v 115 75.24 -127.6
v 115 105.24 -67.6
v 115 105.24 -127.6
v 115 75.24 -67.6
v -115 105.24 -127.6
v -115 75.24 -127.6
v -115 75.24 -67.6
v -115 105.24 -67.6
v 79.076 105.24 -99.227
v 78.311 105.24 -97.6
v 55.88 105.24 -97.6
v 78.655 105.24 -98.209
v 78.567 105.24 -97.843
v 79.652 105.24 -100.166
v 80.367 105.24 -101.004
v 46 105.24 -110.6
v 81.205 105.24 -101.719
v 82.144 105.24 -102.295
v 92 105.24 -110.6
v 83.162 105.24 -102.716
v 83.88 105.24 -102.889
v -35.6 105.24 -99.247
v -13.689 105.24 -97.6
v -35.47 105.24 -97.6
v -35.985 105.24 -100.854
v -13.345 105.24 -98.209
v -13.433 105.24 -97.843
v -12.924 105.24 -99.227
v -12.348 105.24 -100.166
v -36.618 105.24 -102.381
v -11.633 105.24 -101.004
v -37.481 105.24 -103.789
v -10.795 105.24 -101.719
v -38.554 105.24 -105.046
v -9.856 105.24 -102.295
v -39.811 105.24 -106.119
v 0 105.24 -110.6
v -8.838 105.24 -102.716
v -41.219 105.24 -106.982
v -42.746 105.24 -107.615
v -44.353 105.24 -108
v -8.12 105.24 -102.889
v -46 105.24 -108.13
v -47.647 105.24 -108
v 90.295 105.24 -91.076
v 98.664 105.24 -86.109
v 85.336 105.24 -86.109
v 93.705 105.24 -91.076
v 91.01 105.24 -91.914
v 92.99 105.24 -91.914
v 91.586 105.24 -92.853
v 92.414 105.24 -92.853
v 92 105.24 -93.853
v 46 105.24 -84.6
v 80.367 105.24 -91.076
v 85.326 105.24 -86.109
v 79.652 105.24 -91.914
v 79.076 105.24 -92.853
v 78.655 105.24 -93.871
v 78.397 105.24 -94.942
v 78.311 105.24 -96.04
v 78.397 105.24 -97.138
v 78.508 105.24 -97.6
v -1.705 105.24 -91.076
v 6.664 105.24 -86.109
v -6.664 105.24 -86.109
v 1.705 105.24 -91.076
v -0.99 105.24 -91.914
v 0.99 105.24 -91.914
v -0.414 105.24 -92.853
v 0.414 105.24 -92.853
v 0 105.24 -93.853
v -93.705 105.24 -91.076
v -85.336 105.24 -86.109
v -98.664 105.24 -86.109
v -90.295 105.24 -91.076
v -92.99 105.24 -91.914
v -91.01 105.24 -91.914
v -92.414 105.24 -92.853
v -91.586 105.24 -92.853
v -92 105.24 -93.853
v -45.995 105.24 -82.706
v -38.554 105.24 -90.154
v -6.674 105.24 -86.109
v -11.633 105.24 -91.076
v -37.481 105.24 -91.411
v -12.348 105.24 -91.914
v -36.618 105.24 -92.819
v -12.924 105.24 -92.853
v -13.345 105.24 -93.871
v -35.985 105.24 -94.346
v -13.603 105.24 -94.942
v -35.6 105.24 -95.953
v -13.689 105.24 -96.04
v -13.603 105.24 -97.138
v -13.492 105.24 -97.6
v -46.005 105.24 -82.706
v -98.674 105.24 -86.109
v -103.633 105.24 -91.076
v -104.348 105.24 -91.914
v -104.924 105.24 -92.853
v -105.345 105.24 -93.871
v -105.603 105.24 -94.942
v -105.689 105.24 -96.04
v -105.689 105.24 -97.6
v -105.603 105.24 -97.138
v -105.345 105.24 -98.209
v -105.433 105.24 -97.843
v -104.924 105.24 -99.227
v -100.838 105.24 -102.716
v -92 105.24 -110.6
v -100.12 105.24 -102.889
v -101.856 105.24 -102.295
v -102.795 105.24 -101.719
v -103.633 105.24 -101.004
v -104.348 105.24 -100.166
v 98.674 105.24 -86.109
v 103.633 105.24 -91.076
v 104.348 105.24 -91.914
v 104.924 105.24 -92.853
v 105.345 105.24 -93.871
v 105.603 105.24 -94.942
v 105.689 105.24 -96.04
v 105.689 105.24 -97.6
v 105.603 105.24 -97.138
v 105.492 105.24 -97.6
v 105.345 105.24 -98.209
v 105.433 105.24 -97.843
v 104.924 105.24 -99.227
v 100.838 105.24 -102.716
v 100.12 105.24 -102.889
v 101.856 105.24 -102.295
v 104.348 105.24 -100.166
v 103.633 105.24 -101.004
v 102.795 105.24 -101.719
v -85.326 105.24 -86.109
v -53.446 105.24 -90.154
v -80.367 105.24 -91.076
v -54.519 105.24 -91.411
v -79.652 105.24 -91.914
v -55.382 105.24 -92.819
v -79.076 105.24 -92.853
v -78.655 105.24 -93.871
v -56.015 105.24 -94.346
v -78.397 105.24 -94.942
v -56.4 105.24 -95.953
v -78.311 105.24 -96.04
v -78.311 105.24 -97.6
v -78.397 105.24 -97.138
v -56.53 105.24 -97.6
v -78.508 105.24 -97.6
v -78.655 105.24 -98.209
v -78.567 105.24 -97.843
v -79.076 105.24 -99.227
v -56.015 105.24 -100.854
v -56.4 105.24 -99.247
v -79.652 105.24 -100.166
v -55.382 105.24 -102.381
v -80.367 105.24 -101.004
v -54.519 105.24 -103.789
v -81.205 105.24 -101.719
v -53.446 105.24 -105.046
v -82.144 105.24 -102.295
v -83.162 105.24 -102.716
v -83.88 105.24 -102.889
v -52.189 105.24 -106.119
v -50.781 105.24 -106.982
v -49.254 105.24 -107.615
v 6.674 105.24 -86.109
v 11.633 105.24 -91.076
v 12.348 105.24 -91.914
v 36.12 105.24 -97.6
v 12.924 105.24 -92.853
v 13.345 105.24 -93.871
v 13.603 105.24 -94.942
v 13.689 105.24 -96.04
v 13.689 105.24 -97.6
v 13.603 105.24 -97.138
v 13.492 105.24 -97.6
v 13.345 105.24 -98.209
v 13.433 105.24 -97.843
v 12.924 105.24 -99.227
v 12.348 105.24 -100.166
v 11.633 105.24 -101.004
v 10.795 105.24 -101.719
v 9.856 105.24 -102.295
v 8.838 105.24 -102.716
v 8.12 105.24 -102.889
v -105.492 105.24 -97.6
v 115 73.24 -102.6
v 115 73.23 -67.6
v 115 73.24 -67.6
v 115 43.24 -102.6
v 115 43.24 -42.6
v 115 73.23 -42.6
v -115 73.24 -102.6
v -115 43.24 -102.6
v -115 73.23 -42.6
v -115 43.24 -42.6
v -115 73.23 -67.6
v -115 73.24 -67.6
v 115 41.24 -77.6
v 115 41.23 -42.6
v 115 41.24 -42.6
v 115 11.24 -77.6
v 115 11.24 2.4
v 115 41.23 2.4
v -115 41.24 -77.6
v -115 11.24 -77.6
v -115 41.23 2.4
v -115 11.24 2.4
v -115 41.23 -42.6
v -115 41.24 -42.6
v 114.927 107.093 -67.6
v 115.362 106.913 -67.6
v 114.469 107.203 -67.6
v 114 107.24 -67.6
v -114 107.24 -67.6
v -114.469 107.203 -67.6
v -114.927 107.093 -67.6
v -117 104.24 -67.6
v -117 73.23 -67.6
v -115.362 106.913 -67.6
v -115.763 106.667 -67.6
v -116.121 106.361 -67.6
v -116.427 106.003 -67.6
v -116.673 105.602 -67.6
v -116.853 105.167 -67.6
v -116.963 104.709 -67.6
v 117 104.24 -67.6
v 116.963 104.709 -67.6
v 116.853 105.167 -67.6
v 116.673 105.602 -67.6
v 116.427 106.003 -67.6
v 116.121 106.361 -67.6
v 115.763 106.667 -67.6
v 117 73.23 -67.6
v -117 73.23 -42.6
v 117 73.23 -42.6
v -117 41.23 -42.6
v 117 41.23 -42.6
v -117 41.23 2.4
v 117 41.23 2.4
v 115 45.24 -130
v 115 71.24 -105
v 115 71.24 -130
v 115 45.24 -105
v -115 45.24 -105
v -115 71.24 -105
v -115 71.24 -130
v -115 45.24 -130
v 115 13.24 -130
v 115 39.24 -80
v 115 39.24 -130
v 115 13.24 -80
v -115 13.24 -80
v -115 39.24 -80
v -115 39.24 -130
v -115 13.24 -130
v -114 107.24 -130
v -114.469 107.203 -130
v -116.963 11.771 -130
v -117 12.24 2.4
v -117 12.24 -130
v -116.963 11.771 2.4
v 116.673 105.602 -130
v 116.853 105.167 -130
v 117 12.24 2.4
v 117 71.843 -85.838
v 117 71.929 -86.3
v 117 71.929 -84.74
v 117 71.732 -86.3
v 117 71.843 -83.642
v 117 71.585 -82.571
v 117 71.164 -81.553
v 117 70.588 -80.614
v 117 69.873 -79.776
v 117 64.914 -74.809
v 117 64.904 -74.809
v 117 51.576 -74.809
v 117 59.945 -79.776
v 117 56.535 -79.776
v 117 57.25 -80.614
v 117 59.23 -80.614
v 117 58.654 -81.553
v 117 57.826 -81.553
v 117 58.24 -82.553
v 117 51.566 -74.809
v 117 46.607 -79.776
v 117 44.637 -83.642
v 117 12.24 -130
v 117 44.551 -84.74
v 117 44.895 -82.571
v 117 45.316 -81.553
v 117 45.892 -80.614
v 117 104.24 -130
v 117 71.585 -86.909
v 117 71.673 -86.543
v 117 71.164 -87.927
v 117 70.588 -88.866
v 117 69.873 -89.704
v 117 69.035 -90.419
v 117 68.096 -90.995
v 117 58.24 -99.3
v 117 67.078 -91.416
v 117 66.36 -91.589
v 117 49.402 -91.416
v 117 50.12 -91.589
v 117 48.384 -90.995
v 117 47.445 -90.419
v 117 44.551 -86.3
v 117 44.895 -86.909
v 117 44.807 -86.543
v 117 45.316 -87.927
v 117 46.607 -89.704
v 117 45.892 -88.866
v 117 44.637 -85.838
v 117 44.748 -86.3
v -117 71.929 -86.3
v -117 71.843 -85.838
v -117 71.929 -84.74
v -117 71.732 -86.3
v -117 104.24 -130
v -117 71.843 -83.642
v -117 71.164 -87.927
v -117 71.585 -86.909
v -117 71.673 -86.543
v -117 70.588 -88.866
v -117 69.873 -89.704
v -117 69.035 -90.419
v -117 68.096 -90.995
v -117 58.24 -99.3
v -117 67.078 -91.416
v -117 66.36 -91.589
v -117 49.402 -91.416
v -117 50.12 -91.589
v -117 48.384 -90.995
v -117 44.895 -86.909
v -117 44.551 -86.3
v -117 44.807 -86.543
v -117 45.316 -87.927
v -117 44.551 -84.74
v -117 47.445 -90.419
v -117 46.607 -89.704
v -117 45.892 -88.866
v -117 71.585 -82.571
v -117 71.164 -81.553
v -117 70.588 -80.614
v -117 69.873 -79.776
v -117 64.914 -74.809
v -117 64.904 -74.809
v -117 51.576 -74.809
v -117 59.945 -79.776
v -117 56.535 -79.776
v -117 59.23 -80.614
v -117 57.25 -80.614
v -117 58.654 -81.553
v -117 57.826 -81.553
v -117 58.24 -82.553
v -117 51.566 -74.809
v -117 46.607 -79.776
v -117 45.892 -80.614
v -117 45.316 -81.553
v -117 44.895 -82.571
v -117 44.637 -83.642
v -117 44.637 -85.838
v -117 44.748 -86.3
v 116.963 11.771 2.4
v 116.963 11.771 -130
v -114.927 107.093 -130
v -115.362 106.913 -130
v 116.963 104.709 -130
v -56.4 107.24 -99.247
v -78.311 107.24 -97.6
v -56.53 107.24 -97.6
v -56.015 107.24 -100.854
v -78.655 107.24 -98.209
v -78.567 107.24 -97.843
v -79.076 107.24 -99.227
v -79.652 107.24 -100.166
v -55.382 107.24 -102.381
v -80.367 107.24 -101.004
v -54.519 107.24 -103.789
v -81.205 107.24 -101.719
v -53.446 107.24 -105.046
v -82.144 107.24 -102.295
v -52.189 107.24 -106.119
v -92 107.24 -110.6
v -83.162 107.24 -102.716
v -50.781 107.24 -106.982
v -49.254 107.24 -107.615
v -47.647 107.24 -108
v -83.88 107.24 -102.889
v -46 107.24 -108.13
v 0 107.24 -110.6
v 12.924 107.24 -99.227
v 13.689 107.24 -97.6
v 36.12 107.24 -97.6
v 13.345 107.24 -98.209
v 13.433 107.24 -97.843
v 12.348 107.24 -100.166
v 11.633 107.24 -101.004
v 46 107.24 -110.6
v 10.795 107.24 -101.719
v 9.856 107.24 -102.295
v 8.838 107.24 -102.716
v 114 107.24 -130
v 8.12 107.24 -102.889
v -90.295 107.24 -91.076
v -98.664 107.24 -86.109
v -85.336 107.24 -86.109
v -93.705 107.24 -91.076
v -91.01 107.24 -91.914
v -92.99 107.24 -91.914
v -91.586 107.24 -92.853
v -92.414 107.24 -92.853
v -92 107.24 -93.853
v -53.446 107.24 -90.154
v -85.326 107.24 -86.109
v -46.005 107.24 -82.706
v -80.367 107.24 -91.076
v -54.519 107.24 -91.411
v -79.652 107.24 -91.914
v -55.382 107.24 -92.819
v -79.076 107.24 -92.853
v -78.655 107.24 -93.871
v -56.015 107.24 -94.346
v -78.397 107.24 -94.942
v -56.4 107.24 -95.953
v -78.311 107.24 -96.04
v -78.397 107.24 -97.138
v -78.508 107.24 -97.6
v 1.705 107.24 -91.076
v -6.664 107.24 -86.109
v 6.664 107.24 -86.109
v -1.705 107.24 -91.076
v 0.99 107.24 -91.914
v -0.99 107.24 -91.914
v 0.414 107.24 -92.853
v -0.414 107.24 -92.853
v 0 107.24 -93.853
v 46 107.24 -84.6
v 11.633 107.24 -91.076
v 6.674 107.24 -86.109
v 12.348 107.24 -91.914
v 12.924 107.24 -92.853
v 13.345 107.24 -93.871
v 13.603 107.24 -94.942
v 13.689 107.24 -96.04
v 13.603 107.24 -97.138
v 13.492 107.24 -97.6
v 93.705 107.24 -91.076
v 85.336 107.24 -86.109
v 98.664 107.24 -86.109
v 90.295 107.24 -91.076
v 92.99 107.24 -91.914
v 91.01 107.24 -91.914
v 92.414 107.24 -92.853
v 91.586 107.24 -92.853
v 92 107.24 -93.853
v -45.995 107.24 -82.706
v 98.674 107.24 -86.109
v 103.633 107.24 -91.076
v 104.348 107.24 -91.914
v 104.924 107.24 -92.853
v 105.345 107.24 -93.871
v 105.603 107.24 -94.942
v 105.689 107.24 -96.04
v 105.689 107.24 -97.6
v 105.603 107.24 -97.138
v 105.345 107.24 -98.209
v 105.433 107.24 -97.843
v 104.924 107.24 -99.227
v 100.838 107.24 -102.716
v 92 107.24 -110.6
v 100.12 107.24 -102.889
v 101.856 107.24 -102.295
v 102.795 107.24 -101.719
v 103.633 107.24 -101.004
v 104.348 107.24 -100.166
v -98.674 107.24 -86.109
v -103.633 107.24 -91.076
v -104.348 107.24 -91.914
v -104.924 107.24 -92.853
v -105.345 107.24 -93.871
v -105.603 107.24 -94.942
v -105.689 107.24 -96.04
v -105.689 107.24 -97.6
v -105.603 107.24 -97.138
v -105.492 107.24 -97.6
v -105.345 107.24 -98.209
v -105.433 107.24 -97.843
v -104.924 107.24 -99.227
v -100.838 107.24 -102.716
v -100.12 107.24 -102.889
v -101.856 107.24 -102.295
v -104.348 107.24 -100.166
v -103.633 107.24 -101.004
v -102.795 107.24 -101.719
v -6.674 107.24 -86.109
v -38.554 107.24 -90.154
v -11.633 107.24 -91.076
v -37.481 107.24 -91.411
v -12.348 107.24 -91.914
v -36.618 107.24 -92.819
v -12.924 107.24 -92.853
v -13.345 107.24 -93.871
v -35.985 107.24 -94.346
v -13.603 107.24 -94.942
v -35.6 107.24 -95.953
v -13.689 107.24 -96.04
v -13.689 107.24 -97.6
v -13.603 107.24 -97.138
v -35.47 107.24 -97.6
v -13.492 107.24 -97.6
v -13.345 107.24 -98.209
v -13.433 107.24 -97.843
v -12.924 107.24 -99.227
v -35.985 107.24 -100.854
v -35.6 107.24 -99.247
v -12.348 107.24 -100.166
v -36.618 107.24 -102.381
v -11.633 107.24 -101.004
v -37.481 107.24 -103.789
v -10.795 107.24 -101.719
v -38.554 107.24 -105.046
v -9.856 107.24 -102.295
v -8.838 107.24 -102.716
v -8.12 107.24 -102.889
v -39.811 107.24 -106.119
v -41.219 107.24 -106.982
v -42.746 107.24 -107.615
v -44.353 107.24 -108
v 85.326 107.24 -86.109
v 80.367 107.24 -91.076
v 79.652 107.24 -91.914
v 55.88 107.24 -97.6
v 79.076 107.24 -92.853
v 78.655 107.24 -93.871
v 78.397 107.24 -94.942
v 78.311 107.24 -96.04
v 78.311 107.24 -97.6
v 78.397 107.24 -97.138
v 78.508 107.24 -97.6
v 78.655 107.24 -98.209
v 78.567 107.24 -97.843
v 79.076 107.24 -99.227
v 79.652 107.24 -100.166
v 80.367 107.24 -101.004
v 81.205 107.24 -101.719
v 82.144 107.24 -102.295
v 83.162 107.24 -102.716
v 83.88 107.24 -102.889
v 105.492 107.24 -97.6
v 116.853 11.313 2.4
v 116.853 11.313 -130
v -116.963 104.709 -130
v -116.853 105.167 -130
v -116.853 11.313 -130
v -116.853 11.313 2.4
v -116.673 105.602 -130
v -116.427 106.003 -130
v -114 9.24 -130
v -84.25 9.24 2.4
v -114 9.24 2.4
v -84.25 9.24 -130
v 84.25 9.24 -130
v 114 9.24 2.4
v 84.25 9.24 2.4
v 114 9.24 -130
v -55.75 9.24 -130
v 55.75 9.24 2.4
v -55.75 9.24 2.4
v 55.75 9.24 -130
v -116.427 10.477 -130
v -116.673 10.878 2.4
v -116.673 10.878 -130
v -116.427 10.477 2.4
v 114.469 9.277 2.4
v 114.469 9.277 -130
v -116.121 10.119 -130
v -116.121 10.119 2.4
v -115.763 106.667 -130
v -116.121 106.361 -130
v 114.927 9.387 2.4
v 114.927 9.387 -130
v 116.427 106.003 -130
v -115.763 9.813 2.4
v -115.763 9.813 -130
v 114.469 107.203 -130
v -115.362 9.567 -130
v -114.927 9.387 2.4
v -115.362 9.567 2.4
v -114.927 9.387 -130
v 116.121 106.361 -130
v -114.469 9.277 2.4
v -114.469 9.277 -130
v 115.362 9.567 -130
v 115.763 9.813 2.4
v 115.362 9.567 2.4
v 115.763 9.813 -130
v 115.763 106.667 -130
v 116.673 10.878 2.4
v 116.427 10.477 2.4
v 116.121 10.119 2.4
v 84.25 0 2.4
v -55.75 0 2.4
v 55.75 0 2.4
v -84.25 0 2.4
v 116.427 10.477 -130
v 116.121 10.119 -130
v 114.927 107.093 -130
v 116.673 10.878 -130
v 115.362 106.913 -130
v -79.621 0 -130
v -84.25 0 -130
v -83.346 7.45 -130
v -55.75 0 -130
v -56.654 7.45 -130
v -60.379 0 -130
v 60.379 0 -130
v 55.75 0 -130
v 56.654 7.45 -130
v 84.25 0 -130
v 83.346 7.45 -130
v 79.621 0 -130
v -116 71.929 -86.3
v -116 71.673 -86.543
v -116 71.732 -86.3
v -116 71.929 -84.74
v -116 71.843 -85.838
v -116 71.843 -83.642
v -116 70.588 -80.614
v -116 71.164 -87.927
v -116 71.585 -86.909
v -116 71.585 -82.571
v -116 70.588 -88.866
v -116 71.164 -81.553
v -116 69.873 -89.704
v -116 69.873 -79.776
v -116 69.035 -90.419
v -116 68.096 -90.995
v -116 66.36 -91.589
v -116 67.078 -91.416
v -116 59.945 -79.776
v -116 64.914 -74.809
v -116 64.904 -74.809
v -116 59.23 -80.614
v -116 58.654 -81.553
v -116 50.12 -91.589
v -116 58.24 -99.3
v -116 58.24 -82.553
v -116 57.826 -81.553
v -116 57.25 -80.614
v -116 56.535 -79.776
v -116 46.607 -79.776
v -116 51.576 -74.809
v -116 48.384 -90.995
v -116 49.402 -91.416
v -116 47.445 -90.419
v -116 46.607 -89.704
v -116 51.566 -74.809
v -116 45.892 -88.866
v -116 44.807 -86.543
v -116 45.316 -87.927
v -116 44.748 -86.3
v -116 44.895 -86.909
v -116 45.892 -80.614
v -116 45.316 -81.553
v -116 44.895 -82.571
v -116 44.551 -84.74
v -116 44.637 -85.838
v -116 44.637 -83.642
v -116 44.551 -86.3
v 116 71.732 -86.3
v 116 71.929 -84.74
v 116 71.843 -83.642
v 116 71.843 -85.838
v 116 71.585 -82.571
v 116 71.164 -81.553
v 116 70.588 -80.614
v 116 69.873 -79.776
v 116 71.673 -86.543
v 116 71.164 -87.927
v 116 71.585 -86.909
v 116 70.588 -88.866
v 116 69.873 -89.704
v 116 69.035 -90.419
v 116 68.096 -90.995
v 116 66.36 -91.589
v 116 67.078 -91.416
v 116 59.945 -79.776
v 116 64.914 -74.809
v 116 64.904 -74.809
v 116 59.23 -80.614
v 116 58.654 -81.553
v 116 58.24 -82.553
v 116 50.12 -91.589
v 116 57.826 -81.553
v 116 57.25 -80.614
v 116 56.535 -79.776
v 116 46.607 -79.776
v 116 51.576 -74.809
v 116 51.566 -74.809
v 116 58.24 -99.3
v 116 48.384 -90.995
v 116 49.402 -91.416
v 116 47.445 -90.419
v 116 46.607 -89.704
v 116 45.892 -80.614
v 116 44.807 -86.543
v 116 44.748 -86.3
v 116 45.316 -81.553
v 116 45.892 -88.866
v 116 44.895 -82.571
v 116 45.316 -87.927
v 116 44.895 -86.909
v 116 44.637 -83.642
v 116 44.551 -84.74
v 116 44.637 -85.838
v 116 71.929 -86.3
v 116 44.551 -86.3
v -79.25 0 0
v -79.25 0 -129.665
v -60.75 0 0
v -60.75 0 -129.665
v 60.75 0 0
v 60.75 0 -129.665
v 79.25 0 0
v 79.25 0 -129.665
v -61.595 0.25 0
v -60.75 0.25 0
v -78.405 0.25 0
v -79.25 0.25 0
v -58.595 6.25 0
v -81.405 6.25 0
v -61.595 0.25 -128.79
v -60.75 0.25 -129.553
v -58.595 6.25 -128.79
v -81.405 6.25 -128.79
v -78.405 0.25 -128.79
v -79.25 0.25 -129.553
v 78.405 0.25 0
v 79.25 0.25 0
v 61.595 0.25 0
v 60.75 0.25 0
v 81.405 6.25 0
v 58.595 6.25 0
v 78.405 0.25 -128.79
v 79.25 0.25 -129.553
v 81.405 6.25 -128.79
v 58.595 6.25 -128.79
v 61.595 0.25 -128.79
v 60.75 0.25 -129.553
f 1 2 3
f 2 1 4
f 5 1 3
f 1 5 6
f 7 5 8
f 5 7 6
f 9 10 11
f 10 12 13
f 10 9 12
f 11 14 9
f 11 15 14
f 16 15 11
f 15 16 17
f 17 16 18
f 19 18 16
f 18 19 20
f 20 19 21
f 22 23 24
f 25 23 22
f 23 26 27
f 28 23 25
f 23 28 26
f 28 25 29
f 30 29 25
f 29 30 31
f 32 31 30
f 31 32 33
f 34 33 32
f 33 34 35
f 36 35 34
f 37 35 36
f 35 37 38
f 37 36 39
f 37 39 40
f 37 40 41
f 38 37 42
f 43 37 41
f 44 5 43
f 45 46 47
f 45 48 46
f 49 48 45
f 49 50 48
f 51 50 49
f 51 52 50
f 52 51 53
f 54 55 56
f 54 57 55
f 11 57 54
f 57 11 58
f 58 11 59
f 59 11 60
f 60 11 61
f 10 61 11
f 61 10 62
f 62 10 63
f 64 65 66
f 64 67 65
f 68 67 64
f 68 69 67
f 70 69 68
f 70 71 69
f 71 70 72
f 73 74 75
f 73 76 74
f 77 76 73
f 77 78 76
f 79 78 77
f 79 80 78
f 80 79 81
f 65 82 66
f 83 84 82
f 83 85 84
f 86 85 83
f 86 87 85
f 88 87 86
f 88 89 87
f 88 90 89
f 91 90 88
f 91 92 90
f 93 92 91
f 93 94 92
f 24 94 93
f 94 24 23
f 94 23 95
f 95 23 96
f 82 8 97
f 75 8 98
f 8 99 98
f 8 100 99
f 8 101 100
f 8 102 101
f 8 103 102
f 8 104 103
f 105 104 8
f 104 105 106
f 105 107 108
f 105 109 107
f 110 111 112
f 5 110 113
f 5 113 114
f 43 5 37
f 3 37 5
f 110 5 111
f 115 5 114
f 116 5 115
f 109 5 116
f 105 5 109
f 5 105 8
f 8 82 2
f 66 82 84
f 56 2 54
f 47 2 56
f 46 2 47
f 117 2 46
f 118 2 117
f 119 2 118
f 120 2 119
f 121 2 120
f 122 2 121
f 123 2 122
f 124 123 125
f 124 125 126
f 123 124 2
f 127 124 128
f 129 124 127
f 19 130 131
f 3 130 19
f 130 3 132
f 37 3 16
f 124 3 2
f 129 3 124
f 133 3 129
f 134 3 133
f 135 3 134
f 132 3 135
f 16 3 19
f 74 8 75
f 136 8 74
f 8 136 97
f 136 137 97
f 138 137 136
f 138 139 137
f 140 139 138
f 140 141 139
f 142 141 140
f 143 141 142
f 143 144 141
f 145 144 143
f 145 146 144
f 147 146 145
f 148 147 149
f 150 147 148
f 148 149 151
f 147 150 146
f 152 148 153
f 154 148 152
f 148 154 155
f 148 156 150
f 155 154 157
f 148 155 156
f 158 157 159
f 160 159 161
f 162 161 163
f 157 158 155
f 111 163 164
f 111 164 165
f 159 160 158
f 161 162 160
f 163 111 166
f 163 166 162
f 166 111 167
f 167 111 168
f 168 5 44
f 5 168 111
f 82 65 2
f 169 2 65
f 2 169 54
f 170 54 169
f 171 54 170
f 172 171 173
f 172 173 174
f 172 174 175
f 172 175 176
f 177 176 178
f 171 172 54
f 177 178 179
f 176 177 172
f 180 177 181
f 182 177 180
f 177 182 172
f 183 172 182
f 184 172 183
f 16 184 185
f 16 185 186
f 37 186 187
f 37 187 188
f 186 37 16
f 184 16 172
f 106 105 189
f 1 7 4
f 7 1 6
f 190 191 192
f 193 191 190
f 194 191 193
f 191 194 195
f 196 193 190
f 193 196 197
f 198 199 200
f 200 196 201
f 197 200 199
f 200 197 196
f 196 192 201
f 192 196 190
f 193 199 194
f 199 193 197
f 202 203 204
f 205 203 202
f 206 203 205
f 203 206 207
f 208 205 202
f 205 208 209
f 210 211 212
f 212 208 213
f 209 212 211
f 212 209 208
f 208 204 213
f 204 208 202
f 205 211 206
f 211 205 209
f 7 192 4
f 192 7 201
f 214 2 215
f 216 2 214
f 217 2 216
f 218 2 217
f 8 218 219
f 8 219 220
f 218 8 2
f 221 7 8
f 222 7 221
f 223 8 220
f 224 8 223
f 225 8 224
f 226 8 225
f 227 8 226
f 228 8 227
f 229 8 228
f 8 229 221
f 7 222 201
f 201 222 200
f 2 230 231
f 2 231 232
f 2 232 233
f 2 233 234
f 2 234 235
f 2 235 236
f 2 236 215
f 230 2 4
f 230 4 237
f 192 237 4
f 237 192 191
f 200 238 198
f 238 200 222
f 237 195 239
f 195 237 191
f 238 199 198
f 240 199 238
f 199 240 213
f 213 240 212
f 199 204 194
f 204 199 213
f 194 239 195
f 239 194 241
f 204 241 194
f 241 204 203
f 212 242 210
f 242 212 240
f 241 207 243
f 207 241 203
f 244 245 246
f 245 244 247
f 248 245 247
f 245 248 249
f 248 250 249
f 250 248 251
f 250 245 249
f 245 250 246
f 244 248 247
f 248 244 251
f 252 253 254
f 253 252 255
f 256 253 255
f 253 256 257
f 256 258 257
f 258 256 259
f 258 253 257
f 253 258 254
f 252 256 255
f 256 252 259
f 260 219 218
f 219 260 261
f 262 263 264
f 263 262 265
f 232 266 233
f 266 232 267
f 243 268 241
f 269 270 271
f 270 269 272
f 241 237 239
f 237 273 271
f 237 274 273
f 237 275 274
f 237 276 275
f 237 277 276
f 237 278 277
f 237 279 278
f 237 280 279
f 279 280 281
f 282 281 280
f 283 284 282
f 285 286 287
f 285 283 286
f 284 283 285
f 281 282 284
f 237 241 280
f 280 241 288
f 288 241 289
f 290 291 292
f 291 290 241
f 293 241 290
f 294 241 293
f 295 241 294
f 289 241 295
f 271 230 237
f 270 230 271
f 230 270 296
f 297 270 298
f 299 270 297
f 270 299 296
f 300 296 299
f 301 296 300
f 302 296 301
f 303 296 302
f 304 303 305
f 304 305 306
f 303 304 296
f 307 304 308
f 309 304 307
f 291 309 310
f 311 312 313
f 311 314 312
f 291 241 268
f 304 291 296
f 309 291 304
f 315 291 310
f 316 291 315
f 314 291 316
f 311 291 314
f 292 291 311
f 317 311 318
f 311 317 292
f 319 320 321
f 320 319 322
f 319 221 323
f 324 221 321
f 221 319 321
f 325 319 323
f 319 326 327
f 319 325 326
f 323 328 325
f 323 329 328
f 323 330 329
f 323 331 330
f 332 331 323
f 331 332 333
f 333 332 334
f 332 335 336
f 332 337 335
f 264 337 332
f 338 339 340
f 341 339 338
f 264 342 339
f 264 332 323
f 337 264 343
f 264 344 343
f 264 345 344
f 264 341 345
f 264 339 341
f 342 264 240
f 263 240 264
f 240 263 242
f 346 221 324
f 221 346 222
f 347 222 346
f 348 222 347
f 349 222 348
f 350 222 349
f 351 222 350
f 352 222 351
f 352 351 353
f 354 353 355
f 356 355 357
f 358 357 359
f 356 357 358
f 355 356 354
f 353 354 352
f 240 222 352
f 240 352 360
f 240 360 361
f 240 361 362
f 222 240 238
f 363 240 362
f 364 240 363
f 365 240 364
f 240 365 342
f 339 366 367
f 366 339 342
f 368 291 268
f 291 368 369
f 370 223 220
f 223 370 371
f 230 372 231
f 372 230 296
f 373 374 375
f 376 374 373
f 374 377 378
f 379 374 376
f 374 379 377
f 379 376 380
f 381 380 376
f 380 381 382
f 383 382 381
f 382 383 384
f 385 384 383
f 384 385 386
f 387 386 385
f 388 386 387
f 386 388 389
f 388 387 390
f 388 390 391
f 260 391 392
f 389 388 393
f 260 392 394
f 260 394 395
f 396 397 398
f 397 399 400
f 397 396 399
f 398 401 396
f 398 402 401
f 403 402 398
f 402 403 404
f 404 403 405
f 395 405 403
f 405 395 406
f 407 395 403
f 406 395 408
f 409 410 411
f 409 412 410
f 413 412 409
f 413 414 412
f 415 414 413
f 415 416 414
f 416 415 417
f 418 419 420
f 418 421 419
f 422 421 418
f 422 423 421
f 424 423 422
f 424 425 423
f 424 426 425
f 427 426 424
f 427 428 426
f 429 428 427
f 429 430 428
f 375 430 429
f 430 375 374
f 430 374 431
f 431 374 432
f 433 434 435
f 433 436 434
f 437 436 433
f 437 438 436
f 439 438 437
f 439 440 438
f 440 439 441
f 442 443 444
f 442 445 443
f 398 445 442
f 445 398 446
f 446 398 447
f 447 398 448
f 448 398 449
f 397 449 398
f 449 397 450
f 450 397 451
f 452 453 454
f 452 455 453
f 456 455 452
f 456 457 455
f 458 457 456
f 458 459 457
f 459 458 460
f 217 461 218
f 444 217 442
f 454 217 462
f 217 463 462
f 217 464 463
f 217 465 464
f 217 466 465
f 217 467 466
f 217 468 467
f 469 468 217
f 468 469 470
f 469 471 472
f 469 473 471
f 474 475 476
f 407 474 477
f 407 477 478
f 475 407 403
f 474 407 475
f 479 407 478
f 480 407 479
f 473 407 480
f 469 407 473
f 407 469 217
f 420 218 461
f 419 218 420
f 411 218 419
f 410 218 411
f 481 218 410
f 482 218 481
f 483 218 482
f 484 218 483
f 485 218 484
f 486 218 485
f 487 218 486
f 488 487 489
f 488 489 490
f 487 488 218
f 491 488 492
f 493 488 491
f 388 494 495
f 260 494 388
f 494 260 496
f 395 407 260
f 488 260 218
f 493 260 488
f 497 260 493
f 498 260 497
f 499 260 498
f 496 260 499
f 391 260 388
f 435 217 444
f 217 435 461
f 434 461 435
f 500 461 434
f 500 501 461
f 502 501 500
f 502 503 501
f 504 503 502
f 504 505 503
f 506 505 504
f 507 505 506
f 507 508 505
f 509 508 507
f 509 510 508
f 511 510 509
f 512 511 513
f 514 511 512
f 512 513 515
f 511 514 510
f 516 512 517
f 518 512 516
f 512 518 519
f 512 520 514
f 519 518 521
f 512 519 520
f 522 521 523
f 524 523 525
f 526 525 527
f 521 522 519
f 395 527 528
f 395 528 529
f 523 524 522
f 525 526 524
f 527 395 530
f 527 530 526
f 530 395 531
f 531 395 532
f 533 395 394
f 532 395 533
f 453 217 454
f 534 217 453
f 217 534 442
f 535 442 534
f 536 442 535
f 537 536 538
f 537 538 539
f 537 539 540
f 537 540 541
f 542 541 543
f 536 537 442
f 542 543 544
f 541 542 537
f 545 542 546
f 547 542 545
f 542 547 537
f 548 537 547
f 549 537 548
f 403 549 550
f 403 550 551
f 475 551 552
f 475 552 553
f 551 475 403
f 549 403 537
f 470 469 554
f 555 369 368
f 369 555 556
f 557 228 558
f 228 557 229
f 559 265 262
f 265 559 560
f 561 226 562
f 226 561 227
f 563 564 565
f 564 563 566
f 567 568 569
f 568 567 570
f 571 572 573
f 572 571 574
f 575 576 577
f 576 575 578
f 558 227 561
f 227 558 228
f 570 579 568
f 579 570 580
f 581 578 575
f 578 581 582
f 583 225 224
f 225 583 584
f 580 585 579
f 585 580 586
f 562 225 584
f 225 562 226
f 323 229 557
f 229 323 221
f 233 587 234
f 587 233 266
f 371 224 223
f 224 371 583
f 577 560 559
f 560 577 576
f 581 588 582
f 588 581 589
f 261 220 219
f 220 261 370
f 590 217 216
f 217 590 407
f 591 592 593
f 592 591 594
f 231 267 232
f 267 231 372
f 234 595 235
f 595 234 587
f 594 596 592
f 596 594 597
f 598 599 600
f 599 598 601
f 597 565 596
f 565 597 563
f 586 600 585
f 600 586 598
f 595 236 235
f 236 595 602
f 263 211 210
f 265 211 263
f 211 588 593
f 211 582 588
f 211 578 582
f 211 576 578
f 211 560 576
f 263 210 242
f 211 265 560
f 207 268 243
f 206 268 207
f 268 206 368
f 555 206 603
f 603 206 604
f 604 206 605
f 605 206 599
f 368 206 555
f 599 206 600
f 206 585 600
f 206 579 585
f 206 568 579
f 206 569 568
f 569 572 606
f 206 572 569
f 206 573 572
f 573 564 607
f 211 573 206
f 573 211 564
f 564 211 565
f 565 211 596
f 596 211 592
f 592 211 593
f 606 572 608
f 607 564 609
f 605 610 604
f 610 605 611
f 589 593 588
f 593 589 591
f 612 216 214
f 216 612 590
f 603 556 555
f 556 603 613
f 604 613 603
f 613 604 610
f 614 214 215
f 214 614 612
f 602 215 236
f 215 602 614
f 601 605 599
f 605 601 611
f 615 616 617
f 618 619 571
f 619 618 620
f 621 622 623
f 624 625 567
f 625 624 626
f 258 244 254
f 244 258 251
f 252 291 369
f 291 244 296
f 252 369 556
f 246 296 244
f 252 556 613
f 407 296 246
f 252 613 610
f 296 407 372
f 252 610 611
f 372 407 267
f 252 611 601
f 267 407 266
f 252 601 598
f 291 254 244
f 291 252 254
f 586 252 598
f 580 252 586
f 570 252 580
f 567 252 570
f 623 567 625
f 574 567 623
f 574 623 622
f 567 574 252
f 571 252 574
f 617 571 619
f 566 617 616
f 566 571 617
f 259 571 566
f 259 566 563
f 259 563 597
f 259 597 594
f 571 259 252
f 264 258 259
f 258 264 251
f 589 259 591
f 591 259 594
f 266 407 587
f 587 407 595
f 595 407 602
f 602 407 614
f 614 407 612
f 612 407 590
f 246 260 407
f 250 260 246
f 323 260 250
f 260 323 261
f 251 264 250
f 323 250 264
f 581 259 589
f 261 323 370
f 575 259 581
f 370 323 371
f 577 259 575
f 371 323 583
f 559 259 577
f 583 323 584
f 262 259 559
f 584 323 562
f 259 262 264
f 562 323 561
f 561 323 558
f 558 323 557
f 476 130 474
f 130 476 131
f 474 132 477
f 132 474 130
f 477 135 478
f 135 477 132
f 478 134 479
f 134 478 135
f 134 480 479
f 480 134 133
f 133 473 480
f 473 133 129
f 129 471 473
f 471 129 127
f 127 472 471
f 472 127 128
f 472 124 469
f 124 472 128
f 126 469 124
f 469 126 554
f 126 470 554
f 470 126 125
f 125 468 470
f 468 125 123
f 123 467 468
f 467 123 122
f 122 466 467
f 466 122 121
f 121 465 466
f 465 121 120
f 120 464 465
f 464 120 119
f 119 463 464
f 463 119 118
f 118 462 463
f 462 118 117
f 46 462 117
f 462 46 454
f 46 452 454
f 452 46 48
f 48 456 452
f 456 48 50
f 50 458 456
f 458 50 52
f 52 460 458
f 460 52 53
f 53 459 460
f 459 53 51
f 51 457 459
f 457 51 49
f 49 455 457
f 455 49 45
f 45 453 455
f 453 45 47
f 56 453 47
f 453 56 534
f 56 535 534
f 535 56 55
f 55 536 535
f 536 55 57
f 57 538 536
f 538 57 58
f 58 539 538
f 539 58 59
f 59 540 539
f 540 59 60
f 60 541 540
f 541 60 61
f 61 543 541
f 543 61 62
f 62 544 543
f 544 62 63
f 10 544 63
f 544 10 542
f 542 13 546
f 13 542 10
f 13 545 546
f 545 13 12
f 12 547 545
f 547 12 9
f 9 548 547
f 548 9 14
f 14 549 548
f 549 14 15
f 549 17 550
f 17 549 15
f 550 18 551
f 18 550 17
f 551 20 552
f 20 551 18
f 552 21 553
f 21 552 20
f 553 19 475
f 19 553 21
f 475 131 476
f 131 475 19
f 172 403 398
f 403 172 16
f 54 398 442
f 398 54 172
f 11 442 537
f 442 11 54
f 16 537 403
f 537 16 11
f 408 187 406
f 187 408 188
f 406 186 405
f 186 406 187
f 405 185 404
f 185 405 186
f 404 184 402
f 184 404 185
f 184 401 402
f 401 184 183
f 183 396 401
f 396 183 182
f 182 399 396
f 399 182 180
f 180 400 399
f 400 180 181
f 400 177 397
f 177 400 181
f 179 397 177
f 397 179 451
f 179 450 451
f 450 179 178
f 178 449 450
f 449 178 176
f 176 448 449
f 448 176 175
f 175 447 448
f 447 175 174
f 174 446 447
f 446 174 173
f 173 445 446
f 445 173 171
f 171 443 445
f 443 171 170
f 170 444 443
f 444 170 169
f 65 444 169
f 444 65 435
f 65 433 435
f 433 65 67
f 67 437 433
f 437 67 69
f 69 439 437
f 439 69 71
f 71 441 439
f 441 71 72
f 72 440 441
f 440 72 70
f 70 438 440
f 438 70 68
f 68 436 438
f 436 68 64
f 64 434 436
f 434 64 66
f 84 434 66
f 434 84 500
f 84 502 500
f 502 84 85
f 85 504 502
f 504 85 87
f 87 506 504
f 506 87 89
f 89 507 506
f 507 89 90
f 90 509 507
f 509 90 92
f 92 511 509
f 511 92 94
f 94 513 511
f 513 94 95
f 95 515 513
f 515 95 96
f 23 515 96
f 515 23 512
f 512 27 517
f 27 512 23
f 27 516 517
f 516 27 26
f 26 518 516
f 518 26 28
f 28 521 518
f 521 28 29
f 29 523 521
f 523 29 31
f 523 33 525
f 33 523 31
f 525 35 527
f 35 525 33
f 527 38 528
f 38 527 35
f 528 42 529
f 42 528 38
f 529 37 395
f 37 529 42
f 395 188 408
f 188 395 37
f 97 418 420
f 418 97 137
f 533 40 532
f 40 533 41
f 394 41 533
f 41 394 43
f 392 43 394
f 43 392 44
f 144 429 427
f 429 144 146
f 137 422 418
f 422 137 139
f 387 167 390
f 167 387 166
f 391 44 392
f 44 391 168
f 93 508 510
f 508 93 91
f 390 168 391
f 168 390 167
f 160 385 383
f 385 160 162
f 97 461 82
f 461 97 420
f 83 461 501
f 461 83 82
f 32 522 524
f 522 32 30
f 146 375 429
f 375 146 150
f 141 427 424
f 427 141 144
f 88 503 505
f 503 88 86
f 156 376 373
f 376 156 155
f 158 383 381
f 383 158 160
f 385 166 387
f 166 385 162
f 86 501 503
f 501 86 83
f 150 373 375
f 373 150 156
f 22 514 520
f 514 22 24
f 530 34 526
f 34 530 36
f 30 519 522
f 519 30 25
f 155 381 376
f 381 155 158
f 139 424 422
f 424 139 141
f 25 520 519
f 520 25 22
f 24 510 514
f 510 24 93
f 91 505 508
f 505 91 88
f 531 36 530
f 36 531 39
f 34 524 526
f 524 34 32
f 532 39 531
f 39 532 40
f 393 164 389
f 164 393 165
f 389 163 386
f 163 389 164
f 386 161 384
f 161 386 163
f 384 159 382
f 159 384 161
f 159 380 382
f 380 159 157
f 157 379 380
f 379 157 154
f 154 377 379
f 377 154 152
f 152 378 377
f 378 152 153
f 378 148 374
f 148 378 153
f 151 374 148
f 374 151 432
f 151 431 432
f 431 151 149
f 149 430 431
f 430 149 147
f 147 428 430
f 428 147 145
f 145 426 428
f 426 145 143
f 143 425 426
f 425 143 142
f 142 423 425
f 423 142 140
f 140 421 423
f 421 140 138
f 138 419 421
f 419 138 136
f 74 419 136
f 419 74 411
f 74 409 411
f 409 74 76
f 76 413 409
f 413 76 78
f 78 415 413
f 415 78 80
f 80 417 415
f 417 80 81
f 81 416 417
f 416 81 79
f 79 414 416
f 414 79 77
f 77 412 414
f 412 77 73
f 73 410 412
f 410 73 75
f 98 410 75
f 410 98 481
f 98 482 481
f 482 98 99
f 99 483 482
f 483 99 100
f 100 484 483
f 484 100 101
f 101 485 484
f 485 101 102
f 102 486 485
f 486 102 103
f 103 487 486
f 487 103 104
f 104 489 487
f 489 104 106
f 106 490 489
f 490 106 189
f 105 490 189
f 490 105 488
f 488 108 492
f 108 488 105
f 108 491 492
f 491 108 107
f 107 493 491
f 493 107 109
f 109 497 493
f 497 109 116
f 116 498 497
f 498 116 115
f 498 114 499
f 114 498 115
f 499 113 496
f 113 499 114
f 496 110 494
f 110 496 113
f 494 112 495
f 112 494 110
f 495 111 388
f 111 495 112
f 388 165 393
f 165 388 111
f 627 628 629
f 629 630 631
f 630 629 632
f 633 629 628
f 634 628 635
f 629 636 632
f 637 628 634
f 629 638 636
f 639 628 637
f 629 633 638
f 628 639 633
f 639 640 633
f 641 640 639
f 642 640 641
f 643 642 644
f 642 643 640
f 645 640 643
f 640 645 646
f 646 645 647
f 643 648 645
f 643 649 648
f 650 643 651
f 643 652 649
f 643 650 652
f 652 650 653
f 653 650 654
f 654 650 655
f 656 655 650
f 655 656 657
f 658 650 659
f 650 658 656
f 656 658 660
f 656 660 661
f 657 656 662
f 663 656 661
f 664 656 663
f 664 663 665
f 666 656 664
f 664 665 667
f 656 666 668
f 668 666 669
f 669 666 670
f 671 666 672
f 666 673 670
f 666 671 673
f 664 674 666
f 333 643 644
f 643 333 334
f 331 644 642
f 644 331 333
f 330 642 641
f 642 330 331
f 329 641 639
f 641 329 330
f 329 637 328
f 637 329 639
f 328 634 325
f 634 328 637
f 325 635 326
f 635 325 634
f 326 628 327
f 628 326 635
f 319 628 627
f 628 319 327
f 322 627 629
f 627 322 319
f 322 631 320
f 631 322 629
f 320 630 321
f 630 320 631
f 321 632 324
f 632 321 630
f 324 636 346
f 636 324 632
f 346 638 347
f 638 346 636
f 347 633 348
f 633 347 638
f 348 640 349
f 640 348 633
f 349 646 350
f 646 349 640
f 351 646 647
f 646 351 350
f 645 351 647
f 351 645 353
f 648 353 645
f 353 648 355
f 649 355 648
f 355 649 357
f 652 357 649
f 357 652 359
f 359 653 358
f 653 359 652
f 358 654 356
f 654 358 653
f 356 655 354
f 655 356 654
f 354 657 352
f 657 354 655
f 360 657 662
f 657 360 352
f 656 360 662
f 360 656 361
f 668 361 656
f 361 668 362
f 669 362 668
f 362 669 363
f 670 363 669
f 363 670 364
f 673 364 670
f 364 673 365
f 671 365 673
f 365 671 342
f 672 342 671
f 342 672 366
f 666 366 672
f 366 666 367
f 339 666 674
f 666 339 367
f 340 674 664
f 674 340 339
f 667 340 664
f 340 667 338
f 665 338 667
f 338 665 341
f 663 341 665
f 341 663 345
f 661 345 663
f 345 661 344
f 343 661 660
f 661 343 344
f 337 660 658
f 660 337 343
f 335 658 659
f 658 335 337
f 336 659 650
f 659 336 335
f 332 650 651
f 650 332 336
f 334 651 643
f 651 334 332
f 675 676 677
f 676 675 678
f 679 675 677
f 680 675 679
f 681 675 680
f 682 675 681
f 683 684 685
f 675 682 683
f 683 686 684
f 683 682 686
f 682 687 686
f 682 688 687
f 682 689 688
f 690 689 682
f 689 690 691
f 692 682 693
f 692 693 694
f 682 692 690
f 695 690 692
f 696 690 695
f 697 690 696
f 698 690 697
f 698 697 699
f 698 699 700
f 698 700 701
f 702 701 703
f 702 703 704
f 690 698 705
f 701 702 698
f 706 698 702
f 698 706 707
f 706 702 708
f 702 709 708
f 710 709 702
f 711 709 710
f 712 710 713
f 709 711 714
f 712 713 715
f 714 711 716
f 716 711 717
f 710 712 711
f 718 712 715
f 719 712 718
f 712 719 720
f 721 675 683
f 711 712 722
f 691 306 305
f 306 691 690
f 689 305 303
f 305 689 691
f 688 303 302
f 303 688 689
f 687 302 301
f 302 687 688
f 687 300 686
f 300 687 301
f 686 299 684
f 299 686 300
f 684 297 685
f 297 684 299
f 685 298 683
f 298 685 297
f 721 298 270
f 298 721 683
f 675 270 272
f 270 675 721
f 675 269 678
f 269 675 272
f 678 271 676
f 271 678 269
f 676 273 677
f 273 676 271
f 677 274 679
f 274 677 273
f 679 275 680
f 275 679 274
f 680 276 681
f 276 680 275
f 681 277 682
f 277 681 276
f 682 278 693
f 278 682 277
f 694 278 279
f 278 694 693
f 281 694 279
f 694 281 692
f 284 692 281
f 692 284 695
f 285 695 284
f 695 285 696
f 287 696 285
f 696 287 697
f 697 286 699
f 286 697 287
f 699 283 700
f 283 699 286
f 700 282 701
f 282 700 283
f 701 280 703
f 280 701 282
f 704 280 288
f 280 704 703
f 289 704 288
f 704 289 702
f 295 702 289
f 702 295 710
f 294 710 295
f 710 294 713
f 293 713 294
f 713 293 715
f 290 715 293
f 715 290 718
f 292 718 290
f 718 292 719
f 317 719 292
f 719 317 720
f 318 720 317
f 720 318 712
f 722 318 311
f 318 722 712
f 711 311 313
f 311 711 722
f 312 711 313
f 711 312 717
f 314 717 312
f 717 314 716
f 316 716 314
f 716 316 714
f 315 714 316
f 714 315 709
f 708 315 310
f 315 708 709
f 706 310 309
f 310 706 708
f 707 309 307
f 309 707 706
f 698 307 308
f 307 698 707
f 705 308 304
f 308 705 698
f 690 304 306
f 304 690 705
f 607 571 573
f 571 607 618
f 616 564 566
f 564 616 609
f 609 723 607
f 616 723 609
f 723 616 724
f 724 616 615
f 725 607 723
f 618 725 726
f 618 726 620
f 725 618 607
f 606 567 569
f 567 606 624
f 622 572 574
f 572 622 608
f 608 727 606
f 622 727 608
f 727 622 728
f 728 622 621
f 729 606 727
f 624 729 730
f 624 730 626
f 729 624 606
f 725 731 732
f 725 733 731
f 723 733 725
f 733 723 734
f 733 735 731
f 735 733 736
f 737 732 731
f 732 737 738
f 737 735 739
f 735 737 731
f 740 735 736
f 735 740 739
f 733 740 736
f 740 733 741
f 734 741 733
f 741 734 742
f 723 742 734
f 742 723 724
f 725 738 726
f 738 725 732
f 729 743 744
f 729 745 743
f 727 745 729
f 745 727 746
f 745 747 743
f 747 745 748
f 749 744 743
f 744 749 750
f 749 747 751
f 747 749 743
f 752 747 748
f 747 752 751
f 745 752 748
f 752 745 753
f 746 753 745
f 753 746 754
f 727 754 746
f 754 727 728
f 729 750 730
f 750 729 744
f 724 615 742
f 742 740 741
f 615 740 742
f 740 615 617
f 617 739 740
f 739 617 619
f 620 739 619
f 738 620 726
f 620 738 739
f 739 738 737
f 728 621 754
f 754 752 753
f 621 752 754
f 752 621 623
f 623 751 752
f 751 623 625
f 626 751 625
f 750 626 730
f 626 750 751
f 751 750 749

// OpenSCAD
// file: rail-clip.scad
// Bunk rail system, shared library.
//
// A rail clip hooks over a bed's top guardrail rail. Its plate carries a
// vertical dovetail tail; every accessory (cup, tissue box, cubby, and
// later a wardrobe rod or hooks) has a matching socket on its back. The
// socket is open at the bottom and capped by a roof at the top: you lower
// the accessory from above, the tail enters through the socket's bottom
// mouth, and the roof comes down onto the tail's top end. Weight and a
// dropped cup push the roof harder onto the tail, so a load can't slide
// the accessory off; only lifting it does. Wide accessories take two or
// more clips.
//
// (Before 2026-11-12 the stop was a floor at the socket's bottom, which
// meant the accessory went on by being pushed UP and any downward load
// slid it off. pipeline/print-check's retention check now fails that.)
//
// Defaults are the owner's caliper readings (2026-11-08) of a Bellemave
// twin low loft (FST00301-TB-AH): top rail 20.74 front-to-back x 20.38
// tall, lower rails about 15.5 tall x 20.18, 80.54 from the top rail's
// bottom to the next rail's top. The owner reports the rails are 80 apart
// all the way down.
//
// Clip axes: X runs along the rail, Y points away from the rail toward
// the accessory, Z is up. The top rail's bottom face is z = 0 and its
// accessory-side face is y = 0. Inside or outside the bed is the same
// part turned the other way round.
//
// Accessory axes: X along the rail, Y away from the clip, Z up. The
// accessory's back face is y = 0 and the underside of the socket roof
// (where the tail's top end bears) is z = 0. The roof is z = 0 to
// dt_roof(); the accessory hangs below.

// ---- dovetail interface (keep these fixed so all parts interchange) ----
function dt_base() = 16;    // tail width at the plate
function dt_tip() = 22;     // tail width at its face
function dt_depth() = 6;    // how far the tail stands off the plate
function dt_wall() = 3;     // accessory material around the socket
function dt_roof() = 2.4;   // socket roof over the tail's top end; carries the load
function dt_block_w(c) = dt_tip() + 2 * c + 2 * dt_wall();
function dt_block_d(c) = dt_depth() + c + dt_wall();

module dt_profile() {
  polygon([[-dt_base() / 2, 0], [dt_base() / 2, 0],
           [dt_tip() / 2, dt_depth()], [-dt_tip() / 2, dt_depth()]]);
}

// male tail on the clip, standing on y = 0, from z0 to z1
module dt_tail(z0, z1) {
  translate([0, 0, z0]) linear_extrude(z1 - z0) dt_profile();
}

// socket cut, clearance c on every mating face, open through y < 0
module dt_socket(z0, z1, c) {
  translate([0, 0, z0]) linear_extrude(z1 - z0) union() {
    offset(delta = c) dt_profile();
    translate([-dt_base() / 2 - c - 1, -1]) square([dt_base() + 2 * c + 2, 1 + c]);
  }
}

// Give an accessory its mount block(s) and socket(s). Children are the
// accessory body, starting at y = dt_block_d(c). The block runs from
// z = -h up to the roof's top (dt_roof()); its socket is open at the
// bottom and stops at the roof. h is how much tail the socket takes; a
// longer tail just shows below the block. xs are the socket centers along
// X (a clip each).
module with_mounts(h, c = 0.25, xs = [0]) {
  bw = dt_block_w(c);
  bd = dt_block_d(c);
  assert(h >= 30, str("with_mounts: only ", h, " mm of tail engaged; 30 is the minimum"));
  difference() {
    union() {
      children();
      for (x = xs) translate([x - bw / 2, 0, -h]) cube([bw, bd + 0.01, h + dt_roof()]);
    }
    for (x = xs) translate([x, 0, 0]) dt_socket(-h - 1, 0, c);
    // 45 deg lead-in chamfer at each socket's bottom mouth
    for (x = xs) translate([x, 0, 0]) hull() {
      translate([0, 0, -h - 0.01]) linear_extrude(0.01) offset(delta = c + 1.2) dt_profile();
      translate([0, 0, -h + 1.2]) linear_extrude(0.01) offset(delta = c) dt_profile();
    }
  }
}

// ---- clip ----
function clip_top(rail_h = 20.38, wall = 3) = rail_h + wall;
function clip_foot(rail_gap = 80.54, brace = 7.5) = -(rail_gap + brace);
function clip_mount_y(clear = 0.4, wall = 3) = clear / 2 + wall;

module rail_clip(rail_d = 20.74, rail_h = 20.38, rail_gap = 80.54,
                 hook_w = 40, wall = 3, leg_t = 2.5, lip = 1.0, lip_h = 2.5,
                 brace = 7.5, clear = 0.4, eps = 0.01,
                 catch = "none", low_h = 15.42, low_d = 15.42, low_set = 2.47, pad_clear = 0.3,
                 catch_clear = 0.6, catch_reach = 1.5, catch_t = 2.5,
                 nub_h = 2, nub_t = 2.5, wrap = false, min_tail = 34) {
  // The clip hangs from one rail (rail_d x rail_h) and catches the next one
  // down (low_d x low_h, rail_gap below, its near face low_set behind this
  // rail's; negative low_set = in front of it). wrap = true: a clip for a
  // single bar; the J catches under the same bar it hangs from, and a short
  // far lip replaces the far leg so it rocks on.
  g  = wrap ? -rail_h : rail_gap;
  lh = wrap ? rail_h : low_h;
  ld = wrap ? rail_d : low_d;
  ls = wrap ? 0 : low_set;
  top_z = clip_top(rail_h, wall);
  foot_z = clip_foot(g, brace);
  near_y = clear / 2;
  far_y = -(rail_d + clear / 2);
  low_face = -ls;                                // next rail's near face
  // the plate stands off whichever face sticks out further
  plate_y = wrap ? near_y : max(near_y, low_face + pad_clear);
  // catch = "hook": a lip snaps under the next rail's near edge; flat top
  // face holds, 45 deg ramp underneath so the plate flexes over the rails.
  // Printed saddle-down the flat face is a ledge over air of about
  // catch_reach (1.5 = owner's pick, 2026-11-16).
  catch_z = -(g + lh) - catch_clear;             // underside of the next rail, plus play
  tip_y = low_face - catch_reach;
  ramp = plate_y - tip_y;
  // catch = "j" (owner's pick, 2026-11-18): a shelf runs right under the
  // next rail, across its full depth, and a nub_h nub turns up behind its
  // far face. It goes on by hooking under first and rocking up over the
  // hanging rail. Printed saddle-down, shelf and nub need supports.
  j_far = low_face - ld - catch_clear;           // shelf's far end, behind the next rail
  catch_bot = catch == "hook" ? catch_z - catch_t - ramp
            : catch == "j" ? catch_z - catch_t - 4 : foot_z;
  // long enough for an accessory's 30 mm of socket, whatever the catch
  plate_z = min(catch_bot, top_z - min_tail);
  assert(catch == "none" || catch == "hook" || catch == "j", str("rail_clip: unknown catch ", catch));
  assert(!wrap || catch == "j", "rail_clip: a single-bar clip (wrap) needs catch = \"j\"");
  // spacer between the plate and this rail's face, when the next rail sticks out further
  if (plate_y > near_y + 0.2) translate([-hook_w / 2, near_y - eps, 0]) cube([hook_w, plate_y - near_y + 2 * eps, rail_h + eps]);
  // pad on the plate's inside that rests on the next rail's face (pad_clear
  // play) when that rail sits behind this one. 45 deg ends.
  pad = plate_y - (low_face + pad_clear);
  if (!wrap && pad > 0.2) translate([hook_w / 2, 0, 0]) rotate([0, -90, 0]) linear_extrude(hook_w)
    // with a catch the pad runs on down into it (no notch for a ledge to hang off)
    let(pb = catch == "none" ? max(-(g + lh), plate_z + pad) : catch_z - eps)
    polygon([[-g + pad, plate_y + eps], [-g, plate_y - pad], [pb, plate_y - pad],
             catch == "none" ? [pb - pad, plate_y + eps] : [pb, plate_y + eps]]);
  translate([-hook_w / 2, plate_y, plate_z]) cube([hook_w, wall, top_z - plate_z]);
  if (catch == "hook") translate([hook_w / 2, 0, 0]) rotate([0, -90, 0]) linear_extrude(hook_w)
    polygon([[catch_z, plate_y + eps], [catch_z, tip_y], [catch_z - catch_t, tip_y],
             [catch_z - catch_t - ramp, plate_y + eps]]);
  if (catch == "j") translate([hook_w / 2, 0, 0]) rotate([0, -90, 0]) linear_extrude(hook_w) union() {
    // shelf under the next rail, from the plate to behind its far face
    polygon([[catch_z, plate_y + eps], [catch_z, j_far - nub_t],
             [catch_z - catch_t, j_far - nub_t], [catch_z - catch_t, plate_y + eps]]);
    // nub up behind the far face, 45 deg lead-in on its outer top edge
    polygon([[catch_z - eps, j_far], [catch_z + nub_h, j_far],
             [catch_z + nub_h, j_far - nub_t + min(nub_h, nub_t) / 2], [catch_z + nub_h - min(nub_h, nub_t) / 2, j_far - nub_t],
             [catch_z - eps, j_far - nub_t]]);
    // 45 deg gusset under the shelf where it meets the plate
    polygon([[catch_z - catch_t + eps, plate_y + eps], [catch_z - catch_t + eps, plate_y - 4],
             [catch_z - catch_t - 4, plate_y + eps]]);
  }
  // saddle across the rail top
  translate([-hook_w / 2, far_y - leg_t, rail_h])
    cube([hook_w, plate_y - far_y + wall + leg_t, wall]);
  if (wrap) {
    // short far lip over the bar's far top edge (the J holds the bottom)
    translate([-hook_w / 2, far_y - leg_t, rail_h - nub_h - 1]) cube([hook_w, leg_t, nub_h + 1 + eps]);
  } else {
    // far leg down the rail's far face
    translate([-hook_w / 2, far_y - leg_t, -lip_h]) cube([hook_w, leg_t, rail_h + lip_h + eps]);
    // snap lip under the rail's far edge, lead-in chamfer on its lower face
    translate([hook_w / 2, far_y, -lip_h]) rotate([0, -90, 0]) linear_extrude(hook_w)
      polygon([[0, 0], [lip_h, 0], [lip_h, lip], [lip_h - lip, lip]]);
  }
  // dovetail tail on the plate's outer face, to the plate's bottom so a
  // catch has no thin neck (accessories just leave it showing below)
  translate([0, plate_y + wall - eps, 0]) dt_tail(plate_z, top_z);
}

// place an accessory (in accessory axes) on a default clip at x
module on_clip(x = 0, clear = 0.4, wall = 3, rail_h = 20.38) {
  translate([x, clip_mount_y(clear, wall), clip_top(rail_h, wall)])
    children();
}

// the bed's rails, for renders only (accessory side is +Y)
// next rail: 15.42 square, its near face 2.47 behind the top rail's (owner's calipers, 2026-11-16)
module rail_ghost(rail_d = 20.74, rail_h = 20.38, rail_gap = 80.54, low_d = 15.42, low_h = 15.42, low_set = 2.47) {
  color("pink", 0.5) {
    translate([-200, -rail_d, 0]) cube([400, rail_d, rail_h]);
    translate([-200, -low_set - low_d, -rail_gap - low_h]) cube([400, low_d, low_h]);
  }
}

// assembly preview: rails, clips at xs, accessory. The clip is the same
// part inside or outside the bed; it just goes on the other way round.
module bunk_assembly(xs = [0]) {
  rail_ghost();
  for (x = xs) color("orchid") translate([x, 0, 0]) rail_clip();
  color("plum") on_clip() children();
}

// pieces of the assembly one at a time, for the print-check tool
module bunk_piece(which, xs = [0]) {
  if (which == "rails") rail_ghost();
  else if (which == "clips") for (x = xs) translate([x, 0, 0]) rail_clip();
  else if (which == "mounted") on_clip() children();
}
// main file
// Bunk book holder: three stepped rows of books, front to back, that hang on
// rail clips (clip.scad), lowered on from above. Each row's floor is a step
// higher than the one in front, so every row of books shows over the one
// before it: pick one out at night, put it back when done.
//
// Picture books are mostly 7-10 in tall (portrait 7x10, landscape 10x8, square
// 7.5-8.5) and board books about 6x6 in (Blurb and Reedsy trim-size guides).
// The walls hold the lower part of a standing book; tops stick up to grab.
//
// Cut-out shapes on the front and ends: heart, diamond, circle (a drop with a
// pointed top) or star, chosen per position and sized to fit.
//
// Print upright as modeled, no supports: the floor sits on the bed, the raised
// steps are hollow with short bridged tops, and every cutout's top is pointed
// at 45 degrees or narrow enough to bridge.

use <rail-clip.scad>

/* [Size] */
width = 230;        // inside, along the rail (the tissue holder's is 232)
rows = 3;           // [1:1:4] rows of books, front to back
row_d = 30;         // inside depth of each row: 2-3 picture books, or one thick board book
step = 25;          // how much higher each row's floor is than the row in front
front_h = 60;       // front row's wall height above its floor
back_extra = 20;    // the back wall rises this much above the row in front's top

/* [Shapes] */
front_shapes = ["heart", "diamond", "heart", "circle", "heart"]; // left to right, as seen from the room; "" leaves a gap.
// heart, diamond and circle print clean upright. "star" works but the tops of its side arms are a near-flat
// 9 mm overhang (print-check WARNs): expect a little sag there.
end_shapes = ["heart"];  // on each end wall, rail side to front
shape_size = 26;    // [12:1:40] each shape's height
shape_frac = 0.5;   // [0.3:0.05:0.7] shape center height, as a fraction of the wall below the next row

/* [Build] */
wall = 2;
floor_t = 2.4;
divider = 2;
corner_r = 3;
clips = 2;
clip_pitch = 140;   // must miss the bed's posts

/* [Fit] */
dt_clear = 0.25;

part = "holder"; // [holder, assembly, rails, clips, mounted]

/* [Hidden] */
$fn = 40;
eps = 0.01;

id = rows * row_d + (rows - 1) * divider;   // inside depth
ow = width + 2 * wall;
od = id + 2 * wall;
y0 = dt_block_d(dt_clear) - eps;
// rows numbered from the front (room side, k = 0) to the back (rail side, k = rows - 1)
function floor_z(k) = floor_t + k * step;   // floor top of row k, from the holder bottom
function wall_top(k) = floor_z(k) + front_h;                              // its wall/divider top
oh = wall_top(rows - 1) + back_extra;    // overall height
bot = dt_roof() - oh;                    // back rim flush with the socket roof
xs = clips >= 2 ? [-clip_pitch / 2, clip_pitch / 2] : [0];
// y of row k's near (rail-side) and far edges, inside; row k = 0 is at the front (large y)
function row_y1(k) = y0 + wall + id - k * (row_d + divider);   // front edge
function row_y0(k) = row_y1(k) - row_d;                         // rail-side edge

assert(rows >= 1 && rows <= 4, "1 to 4 rows");
assert(front_h >= shape_size + 12, "front wall too short for the shapes");
echo(str("book holder: ", rows, " rows of ", row_d, " mm, inside ", width, " x ", id,
         ", outside ", ow, " x ", od, " x ", oh, " mm, clips ", clips));

module rbox(w, d, h, r) {
  hull() for (x = [r, w - r], y = [r, d - r]) translate([x, y, 0]) cylinder(r = r, h = h);
}

// ---- shapes, centered on the origin, height s, tops safe to print upright ----
module heart2d(s) {
  r = s * 0.27;
  // two lobes with 45-degree peaks (a round top would print as an overhang), point down
  translate([0, -s * 0.06]) {
    for (m = [-1, 1]) hull() {
      translate([m * r * 0.95, s * 0.12]) circle(r = r);
      translate([m * r * 0.95, s * 0.12 + r * 1.414]) square(0.01, center = true);
    }
    polygon([[-r * 1.95, s * 0.06], [r * 1.95, s * 0.06], [0, -s * 0.44]]);
  }
}
module star2d(s) {
  R = s / 2; r = R * 0.45;
  polygon([for (i = [0 : 9]) let(a = 90 + i * 36, q = i % 2 == 0 ? R : r) [q * cos(a), q * sin(a) - R * 0.05]]);
}
module diamond2d(s) polygon([[0, s / 2], [s * 0.38, 0], [0, -s / 2], [-s * 0.38, 0]]);
module circle2d(s) {   // teardrop: a 45-degree point on top
  rotate(90) hull() { circle(d = s * 0.9); translate([s * 0.45 * 1.414, 0]) square(0.01, center = true); }
}
module shape2d(n, s) {
  if (n == "heart") heart2d(s);
  else if (n == "star") star2d(s);
  else if (n == "diamond") diamond2d(s);
  else if (n == "circle") circle2d(s * 0.9);
}

module body() {
  difference() {
    union() {
      difference() {
        translate([-ow / 2, y0, bot]) rbox(ow, od, oh, corner_r);
        // each row's well, from its floor up
        for (k = [0 : rows - 1])
          translate([-width / 2, row_y0(k), bot + floor_z(k)]) cube([width, row_d, oh]);
        // each wall is cut down to its row's top: the space above row k's top, in front of row k+1
        for (k = [0 : rows - 2])
          translate([-ow / 2 - 1, row_y0(k) - divider - eps, bot + wall_top(k)])
            cube([ow + 2, (row_y1(0) + wall + 1) - (row_y0(k) - divider), oh]);
        // hollow under the raised floors, open to the bed: steps print as thin walls with bridged tops
        for (k = [1 : rows - 1])
          translate([-width / 2, row_y0(k) + wall, bot - 1])
            cube([width, row_d - 2 * wall, floor_z(k) - floor_t + 1]);
      }
    }
    // front wall shapes, centered in the front row's wall
    n = len(front_shapes);
    if (n > 0) for (i = [0 : n - 1]) if (front_shapes[i] != "")
      // as seen from the room the viewer's left is +X
      translate([width / 2 - (i + 0.5) * width / n, y0 + od + 1, bot + floor_z(0) + front_h * shape_frac])
        rotate([90, 0, 0]) linear_extrude(wall + 2) shape2d(front_shapes[i], shape_size);
    // end wall shapes, one per listed row position, rail side to front
    m = len(end_shapes);
    if (m > 0) for (s = [-1, 1], j = [0 : m - 1]) if (end_shapes[j] != "") {
      yc = y0 + wall + (j + 0.5) * id / m;
      k = max(0, min(rows - 1, floor((row_y1(0) - yc) / (row_d + divider))));   // the row this spot is beside
      zc = bot + min(wall_top(k) * shape_frac, wall_top(k) - shape_size / 2 - 8);   // the end wall there is solid from the bottom up to wall_top(k)
      translate([s * (ow / 2 + 1), yc, zc]) rotate([0, 0, 90]) rotate([90, 0, 0])
        linear_extrude(wall + 2, center = true) shape2d(end_shapes[j], shape_size);
    }
  }
}

module holder() { with_mounts(-bot, dt_clear, xs) body(); }

if (part == "assembly") bunk_assembly(xs) holder();
else if (part == "holder") holder();
else bunk_piece(part, xs) holder();
